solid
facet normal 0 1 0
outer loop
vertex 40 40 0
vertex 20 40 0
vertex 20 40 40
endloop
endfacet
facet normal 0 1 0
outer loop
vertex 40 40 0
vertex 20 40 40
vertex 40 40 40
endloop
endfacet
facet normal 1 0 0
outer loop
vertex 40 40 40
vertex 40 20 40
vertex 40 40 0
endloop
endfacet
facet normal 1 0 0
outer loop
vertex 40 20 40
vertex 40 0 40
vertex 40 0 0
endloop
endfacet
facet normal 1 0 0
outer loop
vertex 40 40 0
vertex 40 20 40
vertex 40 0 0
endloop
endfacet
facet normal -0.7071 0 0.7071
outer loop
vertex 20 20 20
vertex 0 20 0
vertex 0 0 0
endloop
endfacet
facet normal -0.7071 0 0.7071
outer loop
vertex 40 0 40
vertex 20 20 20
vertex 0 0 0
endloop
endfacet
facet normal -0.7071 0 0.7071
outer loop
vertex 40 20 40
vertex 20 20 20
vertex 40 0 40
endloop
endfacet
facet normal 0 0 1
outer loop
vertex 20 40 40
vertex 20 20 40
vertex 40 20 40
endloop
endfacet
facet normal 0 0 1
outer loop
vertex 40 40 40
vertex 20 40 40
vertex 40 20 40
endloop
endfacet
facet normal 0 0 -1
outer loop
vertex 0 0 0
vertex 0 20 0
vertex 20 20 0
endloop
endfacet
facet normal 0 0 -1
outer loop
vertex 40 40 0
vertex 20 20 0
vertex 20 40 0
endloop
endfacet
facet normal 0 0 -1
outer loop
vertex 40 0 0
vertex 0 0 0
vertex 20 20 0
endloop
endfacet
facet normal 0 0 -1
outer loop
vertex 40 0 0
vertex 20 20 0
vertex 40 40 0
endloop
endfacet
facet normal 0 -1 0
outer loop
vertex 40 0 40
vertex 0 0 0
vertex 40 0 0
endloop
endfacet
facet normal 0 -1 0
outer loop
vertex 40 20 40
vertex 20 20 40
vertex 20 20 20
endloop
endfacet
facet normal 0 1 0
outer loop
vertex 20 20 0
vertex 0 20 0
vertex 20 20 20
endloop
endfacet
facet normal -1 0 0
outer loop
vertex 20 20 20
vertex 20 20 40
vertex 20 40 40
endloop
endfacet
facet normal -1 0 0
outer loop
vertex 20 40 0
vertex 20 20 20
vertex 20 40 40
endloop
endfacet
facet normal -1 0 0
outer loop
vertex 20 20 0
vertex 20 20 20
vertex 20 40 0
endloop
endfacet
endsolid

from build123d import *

# Parameters (mm, degrees)
SKETCH1_W           = 40
SKETCH1_H           = 20
BOSS_EXTRUDE1_DEPTH = 40
SKETCH2_W           = 20
SKETCH2_H           = 20
BOSS_EXTRUDE2_DEPTH = 40
CUT_EXTRUDE1_DEPTH  = 20
SKETCH4_W           = 40
SKETCH4_H           = 20
CUT_EXTRUDE2_DEPTH  = 35
CUT_EXTRUDE3_DEPTH  = 35
SKETCH6_W           = 20
SKETCH6_H           = 40
BOSS_EXTRUDE3_DEPTH = 20


with BuildPart() as part:
    # Sketch1 → Boss-Extrude1 (new body)
    with BuildSketch(Plane.XY):
        with Locations((20, 10)):
            Rectangle(SKETCH1_W, SKETCH1_H)
    extrude(amount=BOSS_EXTRUDE1_DEPTH)

    # Sketch2 → Boss-Extrude2 (add)
    with BuildSketch(Plane.XY.offset(40)):
        with Locations((30, 30)):
            Rectangle(SKETCH2_W, SKETCH2_H)
    extrude(amount=-BOSS_EXTRUDE2_DEPTH)

    # Sketch3 → Cut-Extrude1 (cut)
    with BuildSketch(Plane(origin=(0, 40, 0), x_dir=(1, 0, 0), z_dir=(0, 1, 0))):
        Polygon((20, -40), (40, -20), (40, -40), align=None)
    extrude(amount=-CUT_EXTRUDE1_DEPTH, mode=Mode.SUBTRACT)

    # Sketch4 → Cut-Extrude2 (cut)
    with BuildSketch(Plane.ZY.offset(-20)):
        with Locations((20, 30)):
            Rectangle(SKETCH4_W, SKETCH4_H)
    extrude(amount=-CUT_EXTRUDE2_DEPTH, mode=Mode.SUBTRACT)

    # Sketch5 → Cut-Extrude3 (cut)
    with BuildSketch(Plane(origin=(0, 20, 0), x_dir=(1, 0, 0), z_dir=(0, 1, 0))):
        Polygon((0, 0), (40, -40), (0, -40), align=None)
    extrude(amount=-CUT_EXTRUDE3_DEPTH, mode=Mode.SUBTRACT)

    # Sketch6 → Boss-Extrude3 (add)
    with BuildSketch(Plane(origin=(0, 20, 0), x_dir=(1, 0, 0), z_dir=(0, 1, 0))):
        with Locations((30, -20)):
            Rectangle(SKETCH6_W, SKETCH6_H)
    extrude(amount=BOSS_EXTRUDE3_DEPTH)


solid = part.part
